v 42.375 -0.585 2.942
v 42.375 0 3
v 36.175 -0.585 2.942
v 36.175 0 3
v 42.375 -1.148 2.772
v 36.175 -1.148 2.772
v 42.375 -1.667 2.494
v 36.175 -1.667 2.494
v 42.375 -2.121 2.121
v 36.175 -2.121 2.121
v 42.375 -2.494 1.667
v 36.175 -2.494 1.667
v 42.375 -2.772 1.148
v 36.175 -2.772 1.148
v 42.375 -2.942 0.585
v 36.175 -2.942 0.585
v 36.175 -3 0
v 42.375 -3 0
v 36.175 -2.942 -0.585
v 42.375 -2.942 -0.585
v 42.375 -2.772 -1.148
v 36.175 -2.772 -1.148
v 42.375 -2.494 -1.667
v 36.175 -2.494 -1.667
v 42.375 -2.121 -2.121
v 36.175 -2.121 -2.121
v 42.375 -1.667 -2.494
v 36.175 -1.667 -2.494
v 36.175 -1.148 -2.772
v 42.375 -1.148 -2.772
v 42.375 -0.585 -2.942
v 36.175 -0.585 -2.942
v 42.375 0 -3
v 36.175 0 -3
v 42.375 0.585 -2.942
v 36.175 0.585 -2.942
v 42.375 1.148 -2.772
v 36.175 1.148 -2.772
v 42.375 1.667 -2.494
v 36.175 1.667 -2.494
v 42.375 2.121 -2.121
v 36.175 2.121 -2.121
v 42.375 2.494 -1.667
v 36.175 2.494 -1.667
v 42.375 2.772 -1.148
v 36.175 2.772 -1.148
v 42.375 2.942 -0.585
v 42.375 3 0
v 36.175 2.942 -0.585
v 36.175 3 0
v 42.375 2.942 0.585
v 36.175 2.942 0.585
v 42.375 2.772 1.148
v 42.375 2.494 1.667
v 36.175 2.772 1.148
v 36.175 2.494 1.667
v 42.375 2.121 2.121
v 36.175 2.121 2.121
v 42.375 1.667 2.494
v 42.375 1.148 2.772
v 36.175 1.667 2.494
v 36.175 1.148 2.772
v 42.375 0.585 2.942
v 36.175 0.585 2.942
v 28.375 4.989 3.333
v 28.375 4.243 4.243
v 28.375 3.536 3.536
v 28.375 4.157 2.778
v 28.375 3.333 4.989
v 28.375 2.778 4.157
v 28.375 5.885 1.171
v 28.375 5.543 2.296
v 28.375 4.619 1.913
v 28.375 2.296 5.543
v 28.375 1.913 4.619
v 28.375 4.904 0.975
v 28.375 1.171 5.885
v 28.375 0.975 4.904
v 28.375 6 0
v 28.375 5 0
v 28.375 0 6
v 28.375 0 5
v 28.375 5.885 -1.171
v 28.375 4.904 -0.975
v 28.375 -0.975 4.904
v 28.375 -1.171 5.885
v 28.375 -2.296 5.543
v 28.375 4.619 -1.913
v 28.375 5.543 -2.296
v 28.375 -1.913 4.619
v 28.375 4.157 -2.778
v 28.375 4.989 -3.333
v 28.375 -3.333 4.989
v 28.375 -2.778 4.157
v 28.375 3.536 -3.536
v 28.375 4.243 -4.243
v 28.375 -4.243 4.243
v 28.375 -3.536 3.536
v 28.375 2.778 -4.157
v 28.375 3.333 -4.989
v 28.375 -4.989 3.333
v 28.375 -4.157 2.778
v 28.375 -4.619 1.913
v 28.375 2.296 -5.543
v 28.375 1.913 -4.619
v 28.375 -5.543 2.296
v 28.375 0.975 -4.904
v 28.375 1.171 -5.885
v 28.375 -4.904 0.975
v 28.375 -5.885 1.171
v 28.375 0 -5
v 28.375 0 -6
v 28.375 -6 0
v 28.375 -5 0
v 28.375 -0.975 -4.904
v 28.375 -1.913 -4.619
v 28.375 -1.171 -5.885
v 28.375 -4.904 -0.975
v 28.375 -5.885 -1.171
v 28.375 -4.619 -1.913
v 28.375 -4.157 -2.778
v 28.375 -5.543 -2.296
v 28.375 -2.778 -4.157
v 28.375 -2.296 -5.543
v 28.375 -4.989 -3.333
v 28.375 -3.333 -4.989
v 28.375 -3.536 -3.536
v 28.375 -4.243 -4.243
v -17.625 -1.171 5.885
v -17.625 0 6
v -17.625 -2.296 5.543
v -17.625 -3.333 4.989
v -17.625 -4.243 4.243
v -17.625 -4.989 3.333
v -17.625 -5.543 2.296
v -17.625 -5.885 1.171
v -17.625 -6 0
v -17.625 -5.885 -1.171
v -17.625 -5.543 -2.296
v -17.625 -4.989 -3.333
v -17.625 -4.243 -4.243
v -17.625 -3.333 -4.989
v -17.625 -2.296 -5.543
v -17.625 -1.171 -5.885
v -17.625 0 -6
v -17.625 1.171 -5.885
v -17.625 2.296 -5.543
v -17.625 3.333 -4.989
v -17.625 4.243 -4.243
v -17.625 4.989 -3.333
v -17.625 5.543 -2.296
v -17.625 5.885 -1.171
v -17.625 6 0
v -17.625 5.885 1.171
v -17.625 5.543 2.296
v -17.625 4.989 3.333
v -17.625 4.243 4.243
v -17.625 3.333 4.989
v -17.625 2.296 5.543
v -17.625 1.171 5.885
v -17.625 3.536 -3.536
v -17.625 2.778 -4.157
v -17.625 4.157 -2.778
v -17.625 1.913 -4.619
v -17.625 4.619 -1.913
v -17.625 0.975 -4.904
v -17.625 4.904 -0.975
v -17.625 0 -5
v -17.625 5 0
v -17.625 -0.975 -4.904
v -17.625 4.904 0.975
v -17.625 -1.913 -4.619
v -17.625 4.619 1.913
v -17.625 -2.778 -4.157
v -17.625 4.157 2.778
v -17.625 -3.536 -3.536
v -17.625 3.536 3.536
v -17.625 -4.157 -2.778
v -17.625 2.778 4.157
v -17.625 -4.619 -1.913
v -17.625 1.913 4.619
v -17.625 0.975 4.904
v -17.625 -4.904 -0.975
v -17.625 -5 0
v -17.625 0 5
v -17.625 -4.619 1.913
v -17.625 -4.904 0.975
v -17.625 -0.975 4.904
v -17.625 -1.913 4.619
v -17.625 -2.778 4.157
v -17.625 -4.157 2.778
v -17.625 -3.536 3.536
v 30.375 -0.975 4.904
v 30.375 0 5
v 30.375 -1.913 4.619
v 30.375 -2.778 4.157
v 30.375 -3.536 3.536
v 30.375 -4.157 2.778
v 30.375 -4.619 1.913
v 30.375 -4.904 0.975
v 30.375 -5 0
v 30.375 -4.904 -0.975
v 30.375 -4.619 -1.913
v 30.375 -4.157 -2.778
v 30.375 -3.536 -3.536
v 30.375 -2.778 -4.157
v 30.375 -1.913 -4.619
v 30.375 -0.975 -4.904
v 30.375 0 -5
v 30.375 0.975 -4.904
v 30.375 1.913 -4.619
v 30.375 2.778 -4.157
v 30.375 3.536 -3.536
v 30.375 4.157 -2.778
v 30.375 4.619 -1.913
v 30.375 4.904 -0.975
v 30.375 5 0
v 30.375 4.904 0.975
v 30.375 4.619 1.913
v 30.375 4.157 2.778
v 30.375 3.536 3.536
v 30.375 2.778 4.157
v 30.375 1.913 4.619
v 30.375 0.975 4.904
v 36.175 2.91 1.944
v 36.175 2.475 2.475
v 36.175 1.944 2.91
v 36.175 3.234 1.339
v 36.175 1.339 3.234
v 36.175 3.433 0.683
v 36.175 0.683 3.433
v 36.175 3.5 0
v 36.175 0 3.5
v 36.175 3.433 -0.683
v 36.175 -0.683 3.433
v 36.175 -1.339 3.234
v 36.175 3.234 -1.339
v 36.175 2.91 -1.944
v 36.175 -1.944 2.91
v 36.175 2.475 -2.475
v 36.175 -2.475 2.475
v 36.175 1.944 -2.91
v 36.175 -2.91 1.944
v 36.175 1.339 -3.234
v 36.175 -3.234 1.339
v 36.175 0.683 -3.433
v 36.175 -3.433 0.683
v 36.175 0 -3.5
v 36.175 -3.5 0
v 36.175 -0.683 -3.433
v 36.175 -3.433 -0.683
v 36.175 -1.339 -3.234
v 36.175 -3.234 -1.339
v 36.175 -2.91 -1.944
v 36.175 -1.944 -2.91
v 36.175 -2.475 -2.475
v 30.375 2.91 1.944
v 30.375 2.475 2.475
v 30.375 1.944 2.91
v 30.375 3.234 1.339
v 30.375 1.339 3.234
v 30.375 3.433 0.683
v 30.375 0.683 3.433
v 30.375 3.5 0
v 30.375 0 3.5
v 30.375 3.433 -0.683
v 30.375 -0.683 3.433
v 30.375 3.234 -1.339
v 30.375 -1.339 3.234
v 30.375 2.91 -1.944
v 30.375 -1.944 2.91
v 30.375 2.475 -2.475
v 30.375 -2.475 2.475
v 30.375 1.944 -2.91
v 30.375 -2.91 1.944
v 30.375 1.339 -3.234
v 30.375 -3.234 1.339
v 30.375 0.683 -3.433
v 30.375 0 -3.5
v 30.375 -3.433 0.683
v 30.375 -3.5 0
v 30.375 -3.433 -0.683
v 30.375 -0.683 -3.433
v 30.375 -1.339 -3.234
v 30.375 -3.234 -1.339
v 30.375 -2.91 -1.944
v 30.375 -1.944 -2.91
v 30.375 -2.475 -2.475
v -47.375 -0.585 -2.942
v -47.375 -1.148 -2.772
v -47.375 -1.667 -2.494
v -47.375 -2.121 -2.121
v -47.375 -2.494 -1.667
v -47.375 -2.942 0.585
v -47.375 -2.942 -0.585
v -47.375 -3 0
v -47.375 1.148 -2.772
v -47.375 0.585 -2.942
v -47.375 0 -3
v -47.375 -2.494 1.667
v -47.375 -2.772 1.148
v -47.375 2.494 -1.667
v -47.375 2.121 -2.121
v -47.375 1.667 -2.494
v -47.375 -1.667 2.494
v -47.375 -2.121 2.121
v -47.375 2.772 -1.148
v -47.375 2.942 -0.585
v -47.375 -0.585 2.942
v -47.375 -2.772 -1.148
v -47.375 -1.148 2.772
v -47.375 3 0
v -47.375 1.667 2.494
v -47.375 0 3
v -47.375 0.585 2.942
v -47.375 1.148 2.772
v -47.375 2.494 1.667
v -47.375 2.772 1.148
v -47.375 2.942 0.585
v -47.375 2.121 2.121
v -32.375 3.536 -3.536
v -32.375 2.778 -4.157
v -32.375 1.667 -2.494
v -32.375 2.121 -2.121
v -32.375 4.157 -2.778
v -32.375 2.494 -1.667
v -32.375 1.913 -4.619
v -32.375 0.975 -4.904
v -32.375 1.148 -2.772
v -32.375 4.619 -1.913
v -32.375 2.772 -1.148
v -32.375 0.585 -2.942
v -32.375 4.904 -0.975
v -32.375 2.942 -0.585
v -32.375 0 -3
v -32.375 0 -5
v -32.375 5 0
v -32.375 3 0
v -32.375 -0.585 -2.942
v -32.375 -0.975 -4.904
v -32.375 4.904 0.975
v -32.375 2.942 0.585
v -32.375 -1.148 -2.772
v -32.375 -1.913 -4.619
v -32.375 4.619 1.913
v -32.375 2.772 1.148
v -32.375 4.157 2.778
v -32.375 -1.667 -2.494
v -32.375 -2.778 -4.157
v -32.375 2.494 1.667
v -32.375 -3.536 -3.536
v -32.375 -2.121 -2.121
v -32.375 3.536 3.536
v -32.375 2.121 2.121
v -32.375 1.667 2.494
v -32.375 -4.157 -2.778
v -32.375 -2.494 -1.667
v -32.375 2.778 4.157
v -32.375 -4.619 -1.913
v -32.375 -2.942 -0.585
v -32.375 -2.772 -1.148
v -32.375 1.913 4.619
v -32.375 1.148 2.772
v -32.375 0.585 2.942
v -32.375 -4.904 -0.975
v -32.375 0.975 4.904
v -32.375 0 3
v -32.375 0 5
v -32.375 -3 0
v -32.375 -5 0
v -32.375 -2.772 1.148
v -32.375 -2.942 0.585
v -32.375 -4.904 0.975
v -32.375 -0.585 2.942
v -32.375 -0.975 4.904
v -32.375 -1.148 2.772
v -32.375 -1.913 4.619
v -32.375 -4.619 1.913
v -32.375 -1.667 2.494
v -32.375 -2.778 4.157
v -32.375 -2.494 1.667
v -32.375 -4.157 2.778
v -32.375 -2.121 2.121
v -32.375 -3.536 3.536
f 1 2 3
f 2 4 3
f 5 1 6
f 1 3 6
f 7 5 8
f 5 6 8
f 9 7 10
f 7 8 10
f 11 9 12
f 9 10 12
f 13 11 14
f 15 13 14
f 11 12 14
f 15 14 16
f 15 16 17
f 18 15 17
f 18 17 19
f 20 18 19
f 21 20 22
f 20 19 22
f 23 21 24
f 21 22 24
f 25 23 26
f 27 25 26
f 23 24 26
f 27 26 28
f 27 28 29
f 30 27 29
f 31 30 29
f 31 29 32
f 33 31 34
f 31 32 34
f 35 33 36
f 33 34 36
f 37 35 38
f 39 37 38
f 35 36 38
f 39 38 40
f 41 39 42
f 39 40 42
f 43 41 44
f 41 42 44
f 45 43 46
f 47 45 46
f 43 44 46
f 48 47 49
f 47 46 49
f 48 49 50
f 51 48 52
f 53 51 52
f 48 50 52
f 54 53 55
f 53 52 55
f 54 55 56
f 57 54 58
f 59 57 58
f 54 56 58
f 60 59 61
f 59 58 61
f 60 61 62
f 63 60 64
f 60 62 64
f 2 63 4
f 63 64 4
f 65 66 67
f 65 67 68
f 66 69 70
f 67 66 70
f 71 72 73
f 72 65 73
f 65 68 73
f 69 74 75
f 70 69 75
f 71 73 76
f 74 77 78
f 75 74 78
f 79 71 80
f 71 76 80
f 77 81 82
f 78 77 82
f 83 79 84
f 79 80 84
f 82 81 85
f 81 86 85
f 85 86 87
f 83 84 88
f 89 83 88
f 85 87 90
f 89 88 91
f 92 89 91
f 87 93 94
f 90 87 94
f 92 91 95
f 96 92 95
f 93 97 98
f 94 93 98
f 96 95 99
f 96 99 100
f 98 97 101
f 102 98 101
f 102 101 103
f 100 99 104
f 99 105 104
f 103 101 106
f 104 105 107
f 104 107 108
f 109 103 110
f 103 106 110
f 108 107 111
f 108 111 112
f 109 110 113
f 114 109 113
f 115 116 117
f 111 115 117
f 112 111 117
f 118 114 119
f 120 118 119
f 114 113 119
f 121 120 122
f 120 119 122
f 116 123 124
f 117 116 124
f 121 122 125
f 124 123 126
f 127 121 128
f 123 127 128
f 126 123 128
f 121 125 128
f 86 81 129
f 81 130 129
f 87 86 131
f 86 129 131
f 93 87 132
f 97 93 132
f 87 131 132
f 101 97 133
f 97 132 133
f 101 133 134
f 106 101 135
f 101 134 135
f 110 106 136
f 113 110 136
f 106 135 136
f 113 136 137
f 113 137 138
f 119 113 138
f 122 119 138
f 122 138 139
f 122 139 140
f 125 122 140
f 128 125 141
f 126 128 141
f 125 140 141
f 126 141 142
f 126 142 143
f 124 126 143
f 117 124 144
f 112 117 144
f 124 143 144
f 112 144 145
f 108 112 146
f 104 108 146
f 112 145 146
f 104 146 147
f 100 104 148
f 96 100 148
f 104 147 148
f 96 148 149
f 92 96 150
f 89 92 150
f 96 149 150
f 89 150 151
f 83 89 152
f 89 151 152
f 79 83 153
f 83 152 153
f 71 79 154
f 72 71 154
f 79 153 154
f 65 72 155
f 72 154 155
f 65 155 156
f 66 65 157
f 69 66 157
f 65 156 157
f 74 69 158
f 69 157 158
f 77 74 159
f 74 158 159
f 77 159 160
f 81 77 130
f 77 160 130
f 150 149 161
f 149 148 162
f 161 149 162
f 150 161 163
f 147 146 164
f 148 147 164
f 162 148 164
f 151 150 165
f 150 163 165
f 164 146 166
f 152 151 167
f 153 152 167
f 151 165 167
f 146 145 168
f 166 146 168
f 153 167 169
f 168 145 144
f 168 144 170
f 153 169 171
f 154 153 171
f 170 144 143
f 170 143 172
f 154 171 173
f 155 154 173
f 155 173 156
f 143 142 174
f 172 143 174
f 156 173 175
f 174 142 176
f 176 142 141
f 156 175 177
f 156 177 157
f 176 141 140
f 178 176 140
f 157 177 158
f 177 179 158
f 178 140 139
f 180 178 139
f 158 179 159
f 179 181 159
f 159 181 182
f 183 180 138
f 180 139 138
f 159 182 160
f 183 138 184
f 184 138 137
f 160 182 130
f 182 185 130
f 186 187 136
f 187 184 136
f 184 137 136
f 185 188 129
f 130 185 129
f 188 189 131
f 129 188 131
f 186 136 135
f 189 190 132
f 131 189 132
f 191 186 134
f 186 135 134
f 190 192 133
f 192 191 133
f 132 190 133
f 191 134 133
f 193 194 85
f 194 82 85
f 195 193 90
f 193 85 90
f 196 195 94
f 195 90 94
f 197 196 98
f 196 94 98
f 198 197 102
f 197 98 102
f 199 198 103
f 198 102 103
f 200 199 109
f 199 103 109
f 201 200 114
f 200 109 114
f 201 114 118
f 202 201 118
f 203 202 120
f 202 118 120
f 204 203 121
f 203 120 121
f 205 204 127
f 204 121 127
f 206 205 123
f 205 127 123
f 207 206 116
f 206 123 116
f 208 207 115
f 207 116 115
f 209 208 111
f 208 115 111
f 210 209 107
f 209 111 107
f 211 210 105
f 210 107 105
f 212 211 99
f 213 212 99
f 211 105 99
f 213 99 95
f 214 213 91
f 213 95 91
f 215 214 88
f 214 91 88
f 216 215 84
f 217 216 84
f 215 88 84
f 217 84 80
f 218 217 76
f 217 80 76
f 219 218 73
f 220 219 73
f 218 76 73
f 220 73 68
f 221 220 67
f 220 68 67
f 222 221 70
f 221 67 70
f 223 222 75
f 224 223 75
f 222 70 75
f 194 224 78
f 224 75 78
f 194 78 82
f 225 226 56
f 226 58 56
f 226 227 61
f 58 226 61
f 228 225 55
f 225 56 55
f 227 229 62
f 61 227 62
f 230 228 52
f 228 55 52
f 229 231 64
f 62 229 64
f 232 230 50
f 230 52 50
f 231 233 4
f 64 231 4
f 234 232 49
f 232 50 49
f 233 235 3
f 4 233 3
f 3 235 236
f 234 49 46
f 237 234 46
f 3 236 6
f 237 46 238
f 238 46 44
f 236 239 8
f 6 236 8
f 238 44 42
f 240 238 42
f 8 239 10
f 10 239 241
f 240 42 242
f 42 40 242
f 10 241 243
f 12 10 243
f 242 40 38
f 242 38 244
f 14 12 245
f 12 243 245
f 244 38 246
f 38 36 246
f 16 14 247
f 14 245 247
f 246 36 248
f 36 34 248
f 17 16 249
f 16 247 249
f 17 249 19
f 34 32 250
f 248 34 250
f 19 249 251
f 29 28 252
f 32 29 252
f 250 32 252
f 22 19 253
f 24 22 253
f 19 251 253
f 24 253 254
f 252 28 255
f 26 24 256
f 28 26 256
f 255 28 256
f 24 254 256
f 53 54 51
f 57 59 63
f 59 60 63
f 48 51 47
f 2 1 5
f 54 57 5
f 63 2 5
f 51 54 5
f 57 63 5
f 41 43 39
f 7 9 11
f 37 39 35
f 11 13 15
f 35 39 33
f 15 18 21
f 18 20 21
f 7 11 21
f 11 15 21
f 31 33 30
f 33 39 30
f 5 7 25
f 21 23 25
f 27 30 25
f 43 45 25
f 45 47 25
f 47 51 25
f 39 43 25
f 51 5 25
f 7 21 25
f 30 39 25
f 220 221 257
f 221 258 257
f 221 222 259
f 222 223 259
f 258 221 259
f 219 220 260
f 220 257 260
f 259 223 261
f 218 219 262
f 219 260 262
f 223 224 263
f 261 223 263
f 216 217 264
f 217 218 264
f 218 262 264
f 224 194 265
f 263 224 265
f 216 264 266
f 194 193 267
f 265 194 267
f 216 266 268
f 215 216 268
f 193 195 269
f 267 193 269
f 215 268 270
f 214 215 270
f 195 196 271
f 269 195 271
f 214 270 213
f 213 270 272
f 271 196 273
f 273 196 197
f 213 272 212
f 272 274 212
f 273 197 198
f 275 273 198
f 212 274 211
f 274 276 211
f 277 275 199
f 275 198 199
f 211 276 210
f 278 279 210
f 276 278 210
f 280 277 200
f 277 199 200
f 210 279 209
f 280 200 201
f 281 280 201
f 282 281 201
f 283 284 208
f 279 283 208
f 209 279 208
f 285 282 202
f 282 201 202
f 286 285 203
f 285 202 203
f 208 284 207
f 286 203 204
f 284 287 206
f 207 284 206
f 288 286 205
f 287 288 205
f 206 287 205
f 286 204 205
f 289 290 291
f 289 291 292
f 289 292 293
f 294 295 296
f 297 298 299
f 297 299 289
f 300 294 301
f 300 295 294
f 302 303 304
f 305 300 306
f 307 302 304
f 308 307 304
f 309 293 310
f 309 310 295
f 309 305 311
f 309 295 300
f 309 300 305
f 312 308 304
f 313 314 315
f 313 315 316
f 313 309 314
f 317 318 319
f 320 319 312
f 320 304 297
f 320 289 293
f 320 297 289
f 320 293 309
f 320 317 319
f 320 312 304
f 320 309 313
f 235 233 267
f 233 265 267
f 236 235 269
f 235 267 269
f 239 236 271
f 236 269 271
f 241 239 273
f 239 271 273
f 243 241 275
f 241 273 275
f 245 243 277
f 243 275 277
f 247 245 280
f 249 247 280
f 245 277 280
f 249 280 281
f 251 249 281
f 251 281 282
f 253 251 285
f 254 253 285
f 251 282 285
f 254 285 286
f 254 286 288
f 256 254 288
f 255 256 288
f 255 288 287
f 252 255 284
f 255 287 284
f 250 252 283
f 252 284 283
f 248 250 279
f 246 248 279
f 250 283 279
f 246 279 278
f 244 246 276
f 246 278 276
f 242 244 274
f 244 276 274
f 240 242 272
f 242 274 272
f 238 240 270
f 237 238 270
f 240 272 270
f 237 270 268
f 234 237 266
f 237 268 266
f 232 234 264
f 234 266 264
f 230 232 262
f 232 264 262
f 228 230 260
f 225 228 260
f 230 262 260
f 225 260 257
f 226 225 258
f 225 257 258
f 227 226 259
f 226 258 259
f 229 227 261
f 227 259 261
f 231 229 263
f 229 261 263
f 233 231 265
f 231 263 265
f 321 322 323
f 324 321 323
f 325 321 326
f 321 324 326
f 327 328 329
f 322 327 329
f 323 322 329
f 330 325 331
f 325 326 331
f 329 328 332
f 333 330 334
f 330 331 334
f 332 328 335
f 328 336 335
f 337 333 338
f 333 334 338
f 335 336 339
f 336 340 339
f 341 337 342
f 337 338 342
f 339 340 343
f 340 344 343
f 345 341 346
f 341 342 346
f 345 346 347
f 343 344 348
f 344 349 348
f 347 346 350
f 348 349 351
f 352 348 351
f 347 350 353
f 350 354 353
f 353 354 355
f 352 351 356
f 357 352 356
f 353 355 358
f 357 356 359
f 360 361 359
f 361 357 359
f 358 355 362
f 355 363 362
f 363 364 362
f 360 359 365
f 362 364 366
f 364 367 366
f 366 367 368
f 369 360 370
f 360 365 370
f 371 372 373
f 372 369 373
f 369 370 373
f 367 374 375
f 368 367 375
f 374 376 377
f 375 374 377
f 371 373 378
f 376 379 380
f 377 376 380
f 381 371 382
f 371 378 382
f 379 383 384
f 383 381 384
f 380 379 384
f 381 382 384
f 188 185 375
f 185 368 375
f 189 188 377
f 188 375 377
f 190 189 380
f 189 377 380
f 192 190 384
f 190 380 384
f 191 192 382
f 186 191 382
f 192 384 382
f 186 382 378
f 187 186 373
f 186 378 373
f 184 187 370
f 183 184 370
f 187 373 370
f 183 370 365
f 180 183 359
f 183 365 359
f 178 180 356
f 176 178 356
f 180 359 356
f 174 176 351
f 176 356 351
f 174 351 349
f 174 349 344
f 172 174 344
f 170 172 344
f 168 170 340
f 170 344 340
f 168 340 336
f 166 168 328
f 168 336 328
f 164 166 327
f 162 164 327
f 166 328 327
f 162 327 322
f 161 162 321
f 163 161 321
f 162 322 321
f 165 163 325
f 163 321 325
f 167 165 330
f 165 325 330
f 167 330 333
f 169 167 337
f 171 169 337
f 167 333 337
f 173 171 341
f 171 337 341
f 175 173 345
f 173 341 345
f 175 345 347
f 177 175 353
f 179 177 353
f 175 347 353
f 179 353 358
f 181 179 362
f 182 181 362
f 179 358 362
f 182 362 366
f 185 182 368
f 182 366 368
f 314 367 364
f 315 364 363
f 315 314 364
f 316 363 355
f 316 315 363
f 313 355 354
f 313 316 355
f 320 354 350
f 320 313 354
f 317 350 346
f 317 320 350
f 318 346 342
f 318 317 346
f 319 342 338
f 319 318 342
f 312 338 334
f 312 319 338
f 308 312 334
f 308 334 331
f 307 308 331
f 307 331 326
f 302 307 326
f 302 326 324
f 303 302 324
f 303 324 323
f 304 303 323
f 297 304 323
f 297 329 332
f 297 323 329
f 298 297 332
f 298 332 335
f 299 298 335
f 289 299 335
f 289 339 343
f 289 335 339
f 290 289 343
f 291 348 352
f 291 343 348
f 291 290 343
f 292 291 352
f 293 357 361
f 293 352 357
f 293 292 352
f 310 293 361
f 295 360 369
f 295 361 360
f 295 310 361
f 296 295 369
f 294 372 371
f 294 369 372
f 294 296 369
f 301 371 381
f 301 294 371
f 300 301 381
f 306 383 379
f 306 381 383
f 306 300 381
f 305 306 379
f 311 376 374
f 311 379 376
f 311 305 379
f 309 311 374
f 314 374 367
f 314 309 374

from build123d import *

# Parameters (mm, degrees)
BOSS_EXTRUDE2_START = 5
SKETCH6_R           = 3
BOSS_EXTRUDE2_DEPTH = 5


with BuildPart() as part:
    # Sketch2 → Revolve1 (revolve)
    with BuildSketch(Plane.XY, mode=Mode.PRIVATE) as revolve1_sk:
        Polygon((-42.375, 0), (42.375, 0), (42.375, 3), (36.175, 3), (36.175, 3.5), (30.375, 3.5), (30.375, 5), (28.375, 5), (28.375, 6), (-17.625, 6), (-17.625, 5), (-32.375, 5), (-32.375, 3), (-42.375, 3), align=None)
    revolve(revolve1_sk.sketch.rotate(Axis((-42.375, 0, 0), (1, 0, 0)), 90), axis=Axis((-42.375, 0, 0), (1, 0, 0)))

    # Sketch6 → Boss-Extrude2 (add)
    with BuildSketch(Plane.ZY.offset(42.375).offset(BOSS_EXTRUDE2_START)):
        Circle(SKETCH6_R)
    extrude(amount=-BOSS_EXTRUDE2_DEPTH)


solid = part.part
